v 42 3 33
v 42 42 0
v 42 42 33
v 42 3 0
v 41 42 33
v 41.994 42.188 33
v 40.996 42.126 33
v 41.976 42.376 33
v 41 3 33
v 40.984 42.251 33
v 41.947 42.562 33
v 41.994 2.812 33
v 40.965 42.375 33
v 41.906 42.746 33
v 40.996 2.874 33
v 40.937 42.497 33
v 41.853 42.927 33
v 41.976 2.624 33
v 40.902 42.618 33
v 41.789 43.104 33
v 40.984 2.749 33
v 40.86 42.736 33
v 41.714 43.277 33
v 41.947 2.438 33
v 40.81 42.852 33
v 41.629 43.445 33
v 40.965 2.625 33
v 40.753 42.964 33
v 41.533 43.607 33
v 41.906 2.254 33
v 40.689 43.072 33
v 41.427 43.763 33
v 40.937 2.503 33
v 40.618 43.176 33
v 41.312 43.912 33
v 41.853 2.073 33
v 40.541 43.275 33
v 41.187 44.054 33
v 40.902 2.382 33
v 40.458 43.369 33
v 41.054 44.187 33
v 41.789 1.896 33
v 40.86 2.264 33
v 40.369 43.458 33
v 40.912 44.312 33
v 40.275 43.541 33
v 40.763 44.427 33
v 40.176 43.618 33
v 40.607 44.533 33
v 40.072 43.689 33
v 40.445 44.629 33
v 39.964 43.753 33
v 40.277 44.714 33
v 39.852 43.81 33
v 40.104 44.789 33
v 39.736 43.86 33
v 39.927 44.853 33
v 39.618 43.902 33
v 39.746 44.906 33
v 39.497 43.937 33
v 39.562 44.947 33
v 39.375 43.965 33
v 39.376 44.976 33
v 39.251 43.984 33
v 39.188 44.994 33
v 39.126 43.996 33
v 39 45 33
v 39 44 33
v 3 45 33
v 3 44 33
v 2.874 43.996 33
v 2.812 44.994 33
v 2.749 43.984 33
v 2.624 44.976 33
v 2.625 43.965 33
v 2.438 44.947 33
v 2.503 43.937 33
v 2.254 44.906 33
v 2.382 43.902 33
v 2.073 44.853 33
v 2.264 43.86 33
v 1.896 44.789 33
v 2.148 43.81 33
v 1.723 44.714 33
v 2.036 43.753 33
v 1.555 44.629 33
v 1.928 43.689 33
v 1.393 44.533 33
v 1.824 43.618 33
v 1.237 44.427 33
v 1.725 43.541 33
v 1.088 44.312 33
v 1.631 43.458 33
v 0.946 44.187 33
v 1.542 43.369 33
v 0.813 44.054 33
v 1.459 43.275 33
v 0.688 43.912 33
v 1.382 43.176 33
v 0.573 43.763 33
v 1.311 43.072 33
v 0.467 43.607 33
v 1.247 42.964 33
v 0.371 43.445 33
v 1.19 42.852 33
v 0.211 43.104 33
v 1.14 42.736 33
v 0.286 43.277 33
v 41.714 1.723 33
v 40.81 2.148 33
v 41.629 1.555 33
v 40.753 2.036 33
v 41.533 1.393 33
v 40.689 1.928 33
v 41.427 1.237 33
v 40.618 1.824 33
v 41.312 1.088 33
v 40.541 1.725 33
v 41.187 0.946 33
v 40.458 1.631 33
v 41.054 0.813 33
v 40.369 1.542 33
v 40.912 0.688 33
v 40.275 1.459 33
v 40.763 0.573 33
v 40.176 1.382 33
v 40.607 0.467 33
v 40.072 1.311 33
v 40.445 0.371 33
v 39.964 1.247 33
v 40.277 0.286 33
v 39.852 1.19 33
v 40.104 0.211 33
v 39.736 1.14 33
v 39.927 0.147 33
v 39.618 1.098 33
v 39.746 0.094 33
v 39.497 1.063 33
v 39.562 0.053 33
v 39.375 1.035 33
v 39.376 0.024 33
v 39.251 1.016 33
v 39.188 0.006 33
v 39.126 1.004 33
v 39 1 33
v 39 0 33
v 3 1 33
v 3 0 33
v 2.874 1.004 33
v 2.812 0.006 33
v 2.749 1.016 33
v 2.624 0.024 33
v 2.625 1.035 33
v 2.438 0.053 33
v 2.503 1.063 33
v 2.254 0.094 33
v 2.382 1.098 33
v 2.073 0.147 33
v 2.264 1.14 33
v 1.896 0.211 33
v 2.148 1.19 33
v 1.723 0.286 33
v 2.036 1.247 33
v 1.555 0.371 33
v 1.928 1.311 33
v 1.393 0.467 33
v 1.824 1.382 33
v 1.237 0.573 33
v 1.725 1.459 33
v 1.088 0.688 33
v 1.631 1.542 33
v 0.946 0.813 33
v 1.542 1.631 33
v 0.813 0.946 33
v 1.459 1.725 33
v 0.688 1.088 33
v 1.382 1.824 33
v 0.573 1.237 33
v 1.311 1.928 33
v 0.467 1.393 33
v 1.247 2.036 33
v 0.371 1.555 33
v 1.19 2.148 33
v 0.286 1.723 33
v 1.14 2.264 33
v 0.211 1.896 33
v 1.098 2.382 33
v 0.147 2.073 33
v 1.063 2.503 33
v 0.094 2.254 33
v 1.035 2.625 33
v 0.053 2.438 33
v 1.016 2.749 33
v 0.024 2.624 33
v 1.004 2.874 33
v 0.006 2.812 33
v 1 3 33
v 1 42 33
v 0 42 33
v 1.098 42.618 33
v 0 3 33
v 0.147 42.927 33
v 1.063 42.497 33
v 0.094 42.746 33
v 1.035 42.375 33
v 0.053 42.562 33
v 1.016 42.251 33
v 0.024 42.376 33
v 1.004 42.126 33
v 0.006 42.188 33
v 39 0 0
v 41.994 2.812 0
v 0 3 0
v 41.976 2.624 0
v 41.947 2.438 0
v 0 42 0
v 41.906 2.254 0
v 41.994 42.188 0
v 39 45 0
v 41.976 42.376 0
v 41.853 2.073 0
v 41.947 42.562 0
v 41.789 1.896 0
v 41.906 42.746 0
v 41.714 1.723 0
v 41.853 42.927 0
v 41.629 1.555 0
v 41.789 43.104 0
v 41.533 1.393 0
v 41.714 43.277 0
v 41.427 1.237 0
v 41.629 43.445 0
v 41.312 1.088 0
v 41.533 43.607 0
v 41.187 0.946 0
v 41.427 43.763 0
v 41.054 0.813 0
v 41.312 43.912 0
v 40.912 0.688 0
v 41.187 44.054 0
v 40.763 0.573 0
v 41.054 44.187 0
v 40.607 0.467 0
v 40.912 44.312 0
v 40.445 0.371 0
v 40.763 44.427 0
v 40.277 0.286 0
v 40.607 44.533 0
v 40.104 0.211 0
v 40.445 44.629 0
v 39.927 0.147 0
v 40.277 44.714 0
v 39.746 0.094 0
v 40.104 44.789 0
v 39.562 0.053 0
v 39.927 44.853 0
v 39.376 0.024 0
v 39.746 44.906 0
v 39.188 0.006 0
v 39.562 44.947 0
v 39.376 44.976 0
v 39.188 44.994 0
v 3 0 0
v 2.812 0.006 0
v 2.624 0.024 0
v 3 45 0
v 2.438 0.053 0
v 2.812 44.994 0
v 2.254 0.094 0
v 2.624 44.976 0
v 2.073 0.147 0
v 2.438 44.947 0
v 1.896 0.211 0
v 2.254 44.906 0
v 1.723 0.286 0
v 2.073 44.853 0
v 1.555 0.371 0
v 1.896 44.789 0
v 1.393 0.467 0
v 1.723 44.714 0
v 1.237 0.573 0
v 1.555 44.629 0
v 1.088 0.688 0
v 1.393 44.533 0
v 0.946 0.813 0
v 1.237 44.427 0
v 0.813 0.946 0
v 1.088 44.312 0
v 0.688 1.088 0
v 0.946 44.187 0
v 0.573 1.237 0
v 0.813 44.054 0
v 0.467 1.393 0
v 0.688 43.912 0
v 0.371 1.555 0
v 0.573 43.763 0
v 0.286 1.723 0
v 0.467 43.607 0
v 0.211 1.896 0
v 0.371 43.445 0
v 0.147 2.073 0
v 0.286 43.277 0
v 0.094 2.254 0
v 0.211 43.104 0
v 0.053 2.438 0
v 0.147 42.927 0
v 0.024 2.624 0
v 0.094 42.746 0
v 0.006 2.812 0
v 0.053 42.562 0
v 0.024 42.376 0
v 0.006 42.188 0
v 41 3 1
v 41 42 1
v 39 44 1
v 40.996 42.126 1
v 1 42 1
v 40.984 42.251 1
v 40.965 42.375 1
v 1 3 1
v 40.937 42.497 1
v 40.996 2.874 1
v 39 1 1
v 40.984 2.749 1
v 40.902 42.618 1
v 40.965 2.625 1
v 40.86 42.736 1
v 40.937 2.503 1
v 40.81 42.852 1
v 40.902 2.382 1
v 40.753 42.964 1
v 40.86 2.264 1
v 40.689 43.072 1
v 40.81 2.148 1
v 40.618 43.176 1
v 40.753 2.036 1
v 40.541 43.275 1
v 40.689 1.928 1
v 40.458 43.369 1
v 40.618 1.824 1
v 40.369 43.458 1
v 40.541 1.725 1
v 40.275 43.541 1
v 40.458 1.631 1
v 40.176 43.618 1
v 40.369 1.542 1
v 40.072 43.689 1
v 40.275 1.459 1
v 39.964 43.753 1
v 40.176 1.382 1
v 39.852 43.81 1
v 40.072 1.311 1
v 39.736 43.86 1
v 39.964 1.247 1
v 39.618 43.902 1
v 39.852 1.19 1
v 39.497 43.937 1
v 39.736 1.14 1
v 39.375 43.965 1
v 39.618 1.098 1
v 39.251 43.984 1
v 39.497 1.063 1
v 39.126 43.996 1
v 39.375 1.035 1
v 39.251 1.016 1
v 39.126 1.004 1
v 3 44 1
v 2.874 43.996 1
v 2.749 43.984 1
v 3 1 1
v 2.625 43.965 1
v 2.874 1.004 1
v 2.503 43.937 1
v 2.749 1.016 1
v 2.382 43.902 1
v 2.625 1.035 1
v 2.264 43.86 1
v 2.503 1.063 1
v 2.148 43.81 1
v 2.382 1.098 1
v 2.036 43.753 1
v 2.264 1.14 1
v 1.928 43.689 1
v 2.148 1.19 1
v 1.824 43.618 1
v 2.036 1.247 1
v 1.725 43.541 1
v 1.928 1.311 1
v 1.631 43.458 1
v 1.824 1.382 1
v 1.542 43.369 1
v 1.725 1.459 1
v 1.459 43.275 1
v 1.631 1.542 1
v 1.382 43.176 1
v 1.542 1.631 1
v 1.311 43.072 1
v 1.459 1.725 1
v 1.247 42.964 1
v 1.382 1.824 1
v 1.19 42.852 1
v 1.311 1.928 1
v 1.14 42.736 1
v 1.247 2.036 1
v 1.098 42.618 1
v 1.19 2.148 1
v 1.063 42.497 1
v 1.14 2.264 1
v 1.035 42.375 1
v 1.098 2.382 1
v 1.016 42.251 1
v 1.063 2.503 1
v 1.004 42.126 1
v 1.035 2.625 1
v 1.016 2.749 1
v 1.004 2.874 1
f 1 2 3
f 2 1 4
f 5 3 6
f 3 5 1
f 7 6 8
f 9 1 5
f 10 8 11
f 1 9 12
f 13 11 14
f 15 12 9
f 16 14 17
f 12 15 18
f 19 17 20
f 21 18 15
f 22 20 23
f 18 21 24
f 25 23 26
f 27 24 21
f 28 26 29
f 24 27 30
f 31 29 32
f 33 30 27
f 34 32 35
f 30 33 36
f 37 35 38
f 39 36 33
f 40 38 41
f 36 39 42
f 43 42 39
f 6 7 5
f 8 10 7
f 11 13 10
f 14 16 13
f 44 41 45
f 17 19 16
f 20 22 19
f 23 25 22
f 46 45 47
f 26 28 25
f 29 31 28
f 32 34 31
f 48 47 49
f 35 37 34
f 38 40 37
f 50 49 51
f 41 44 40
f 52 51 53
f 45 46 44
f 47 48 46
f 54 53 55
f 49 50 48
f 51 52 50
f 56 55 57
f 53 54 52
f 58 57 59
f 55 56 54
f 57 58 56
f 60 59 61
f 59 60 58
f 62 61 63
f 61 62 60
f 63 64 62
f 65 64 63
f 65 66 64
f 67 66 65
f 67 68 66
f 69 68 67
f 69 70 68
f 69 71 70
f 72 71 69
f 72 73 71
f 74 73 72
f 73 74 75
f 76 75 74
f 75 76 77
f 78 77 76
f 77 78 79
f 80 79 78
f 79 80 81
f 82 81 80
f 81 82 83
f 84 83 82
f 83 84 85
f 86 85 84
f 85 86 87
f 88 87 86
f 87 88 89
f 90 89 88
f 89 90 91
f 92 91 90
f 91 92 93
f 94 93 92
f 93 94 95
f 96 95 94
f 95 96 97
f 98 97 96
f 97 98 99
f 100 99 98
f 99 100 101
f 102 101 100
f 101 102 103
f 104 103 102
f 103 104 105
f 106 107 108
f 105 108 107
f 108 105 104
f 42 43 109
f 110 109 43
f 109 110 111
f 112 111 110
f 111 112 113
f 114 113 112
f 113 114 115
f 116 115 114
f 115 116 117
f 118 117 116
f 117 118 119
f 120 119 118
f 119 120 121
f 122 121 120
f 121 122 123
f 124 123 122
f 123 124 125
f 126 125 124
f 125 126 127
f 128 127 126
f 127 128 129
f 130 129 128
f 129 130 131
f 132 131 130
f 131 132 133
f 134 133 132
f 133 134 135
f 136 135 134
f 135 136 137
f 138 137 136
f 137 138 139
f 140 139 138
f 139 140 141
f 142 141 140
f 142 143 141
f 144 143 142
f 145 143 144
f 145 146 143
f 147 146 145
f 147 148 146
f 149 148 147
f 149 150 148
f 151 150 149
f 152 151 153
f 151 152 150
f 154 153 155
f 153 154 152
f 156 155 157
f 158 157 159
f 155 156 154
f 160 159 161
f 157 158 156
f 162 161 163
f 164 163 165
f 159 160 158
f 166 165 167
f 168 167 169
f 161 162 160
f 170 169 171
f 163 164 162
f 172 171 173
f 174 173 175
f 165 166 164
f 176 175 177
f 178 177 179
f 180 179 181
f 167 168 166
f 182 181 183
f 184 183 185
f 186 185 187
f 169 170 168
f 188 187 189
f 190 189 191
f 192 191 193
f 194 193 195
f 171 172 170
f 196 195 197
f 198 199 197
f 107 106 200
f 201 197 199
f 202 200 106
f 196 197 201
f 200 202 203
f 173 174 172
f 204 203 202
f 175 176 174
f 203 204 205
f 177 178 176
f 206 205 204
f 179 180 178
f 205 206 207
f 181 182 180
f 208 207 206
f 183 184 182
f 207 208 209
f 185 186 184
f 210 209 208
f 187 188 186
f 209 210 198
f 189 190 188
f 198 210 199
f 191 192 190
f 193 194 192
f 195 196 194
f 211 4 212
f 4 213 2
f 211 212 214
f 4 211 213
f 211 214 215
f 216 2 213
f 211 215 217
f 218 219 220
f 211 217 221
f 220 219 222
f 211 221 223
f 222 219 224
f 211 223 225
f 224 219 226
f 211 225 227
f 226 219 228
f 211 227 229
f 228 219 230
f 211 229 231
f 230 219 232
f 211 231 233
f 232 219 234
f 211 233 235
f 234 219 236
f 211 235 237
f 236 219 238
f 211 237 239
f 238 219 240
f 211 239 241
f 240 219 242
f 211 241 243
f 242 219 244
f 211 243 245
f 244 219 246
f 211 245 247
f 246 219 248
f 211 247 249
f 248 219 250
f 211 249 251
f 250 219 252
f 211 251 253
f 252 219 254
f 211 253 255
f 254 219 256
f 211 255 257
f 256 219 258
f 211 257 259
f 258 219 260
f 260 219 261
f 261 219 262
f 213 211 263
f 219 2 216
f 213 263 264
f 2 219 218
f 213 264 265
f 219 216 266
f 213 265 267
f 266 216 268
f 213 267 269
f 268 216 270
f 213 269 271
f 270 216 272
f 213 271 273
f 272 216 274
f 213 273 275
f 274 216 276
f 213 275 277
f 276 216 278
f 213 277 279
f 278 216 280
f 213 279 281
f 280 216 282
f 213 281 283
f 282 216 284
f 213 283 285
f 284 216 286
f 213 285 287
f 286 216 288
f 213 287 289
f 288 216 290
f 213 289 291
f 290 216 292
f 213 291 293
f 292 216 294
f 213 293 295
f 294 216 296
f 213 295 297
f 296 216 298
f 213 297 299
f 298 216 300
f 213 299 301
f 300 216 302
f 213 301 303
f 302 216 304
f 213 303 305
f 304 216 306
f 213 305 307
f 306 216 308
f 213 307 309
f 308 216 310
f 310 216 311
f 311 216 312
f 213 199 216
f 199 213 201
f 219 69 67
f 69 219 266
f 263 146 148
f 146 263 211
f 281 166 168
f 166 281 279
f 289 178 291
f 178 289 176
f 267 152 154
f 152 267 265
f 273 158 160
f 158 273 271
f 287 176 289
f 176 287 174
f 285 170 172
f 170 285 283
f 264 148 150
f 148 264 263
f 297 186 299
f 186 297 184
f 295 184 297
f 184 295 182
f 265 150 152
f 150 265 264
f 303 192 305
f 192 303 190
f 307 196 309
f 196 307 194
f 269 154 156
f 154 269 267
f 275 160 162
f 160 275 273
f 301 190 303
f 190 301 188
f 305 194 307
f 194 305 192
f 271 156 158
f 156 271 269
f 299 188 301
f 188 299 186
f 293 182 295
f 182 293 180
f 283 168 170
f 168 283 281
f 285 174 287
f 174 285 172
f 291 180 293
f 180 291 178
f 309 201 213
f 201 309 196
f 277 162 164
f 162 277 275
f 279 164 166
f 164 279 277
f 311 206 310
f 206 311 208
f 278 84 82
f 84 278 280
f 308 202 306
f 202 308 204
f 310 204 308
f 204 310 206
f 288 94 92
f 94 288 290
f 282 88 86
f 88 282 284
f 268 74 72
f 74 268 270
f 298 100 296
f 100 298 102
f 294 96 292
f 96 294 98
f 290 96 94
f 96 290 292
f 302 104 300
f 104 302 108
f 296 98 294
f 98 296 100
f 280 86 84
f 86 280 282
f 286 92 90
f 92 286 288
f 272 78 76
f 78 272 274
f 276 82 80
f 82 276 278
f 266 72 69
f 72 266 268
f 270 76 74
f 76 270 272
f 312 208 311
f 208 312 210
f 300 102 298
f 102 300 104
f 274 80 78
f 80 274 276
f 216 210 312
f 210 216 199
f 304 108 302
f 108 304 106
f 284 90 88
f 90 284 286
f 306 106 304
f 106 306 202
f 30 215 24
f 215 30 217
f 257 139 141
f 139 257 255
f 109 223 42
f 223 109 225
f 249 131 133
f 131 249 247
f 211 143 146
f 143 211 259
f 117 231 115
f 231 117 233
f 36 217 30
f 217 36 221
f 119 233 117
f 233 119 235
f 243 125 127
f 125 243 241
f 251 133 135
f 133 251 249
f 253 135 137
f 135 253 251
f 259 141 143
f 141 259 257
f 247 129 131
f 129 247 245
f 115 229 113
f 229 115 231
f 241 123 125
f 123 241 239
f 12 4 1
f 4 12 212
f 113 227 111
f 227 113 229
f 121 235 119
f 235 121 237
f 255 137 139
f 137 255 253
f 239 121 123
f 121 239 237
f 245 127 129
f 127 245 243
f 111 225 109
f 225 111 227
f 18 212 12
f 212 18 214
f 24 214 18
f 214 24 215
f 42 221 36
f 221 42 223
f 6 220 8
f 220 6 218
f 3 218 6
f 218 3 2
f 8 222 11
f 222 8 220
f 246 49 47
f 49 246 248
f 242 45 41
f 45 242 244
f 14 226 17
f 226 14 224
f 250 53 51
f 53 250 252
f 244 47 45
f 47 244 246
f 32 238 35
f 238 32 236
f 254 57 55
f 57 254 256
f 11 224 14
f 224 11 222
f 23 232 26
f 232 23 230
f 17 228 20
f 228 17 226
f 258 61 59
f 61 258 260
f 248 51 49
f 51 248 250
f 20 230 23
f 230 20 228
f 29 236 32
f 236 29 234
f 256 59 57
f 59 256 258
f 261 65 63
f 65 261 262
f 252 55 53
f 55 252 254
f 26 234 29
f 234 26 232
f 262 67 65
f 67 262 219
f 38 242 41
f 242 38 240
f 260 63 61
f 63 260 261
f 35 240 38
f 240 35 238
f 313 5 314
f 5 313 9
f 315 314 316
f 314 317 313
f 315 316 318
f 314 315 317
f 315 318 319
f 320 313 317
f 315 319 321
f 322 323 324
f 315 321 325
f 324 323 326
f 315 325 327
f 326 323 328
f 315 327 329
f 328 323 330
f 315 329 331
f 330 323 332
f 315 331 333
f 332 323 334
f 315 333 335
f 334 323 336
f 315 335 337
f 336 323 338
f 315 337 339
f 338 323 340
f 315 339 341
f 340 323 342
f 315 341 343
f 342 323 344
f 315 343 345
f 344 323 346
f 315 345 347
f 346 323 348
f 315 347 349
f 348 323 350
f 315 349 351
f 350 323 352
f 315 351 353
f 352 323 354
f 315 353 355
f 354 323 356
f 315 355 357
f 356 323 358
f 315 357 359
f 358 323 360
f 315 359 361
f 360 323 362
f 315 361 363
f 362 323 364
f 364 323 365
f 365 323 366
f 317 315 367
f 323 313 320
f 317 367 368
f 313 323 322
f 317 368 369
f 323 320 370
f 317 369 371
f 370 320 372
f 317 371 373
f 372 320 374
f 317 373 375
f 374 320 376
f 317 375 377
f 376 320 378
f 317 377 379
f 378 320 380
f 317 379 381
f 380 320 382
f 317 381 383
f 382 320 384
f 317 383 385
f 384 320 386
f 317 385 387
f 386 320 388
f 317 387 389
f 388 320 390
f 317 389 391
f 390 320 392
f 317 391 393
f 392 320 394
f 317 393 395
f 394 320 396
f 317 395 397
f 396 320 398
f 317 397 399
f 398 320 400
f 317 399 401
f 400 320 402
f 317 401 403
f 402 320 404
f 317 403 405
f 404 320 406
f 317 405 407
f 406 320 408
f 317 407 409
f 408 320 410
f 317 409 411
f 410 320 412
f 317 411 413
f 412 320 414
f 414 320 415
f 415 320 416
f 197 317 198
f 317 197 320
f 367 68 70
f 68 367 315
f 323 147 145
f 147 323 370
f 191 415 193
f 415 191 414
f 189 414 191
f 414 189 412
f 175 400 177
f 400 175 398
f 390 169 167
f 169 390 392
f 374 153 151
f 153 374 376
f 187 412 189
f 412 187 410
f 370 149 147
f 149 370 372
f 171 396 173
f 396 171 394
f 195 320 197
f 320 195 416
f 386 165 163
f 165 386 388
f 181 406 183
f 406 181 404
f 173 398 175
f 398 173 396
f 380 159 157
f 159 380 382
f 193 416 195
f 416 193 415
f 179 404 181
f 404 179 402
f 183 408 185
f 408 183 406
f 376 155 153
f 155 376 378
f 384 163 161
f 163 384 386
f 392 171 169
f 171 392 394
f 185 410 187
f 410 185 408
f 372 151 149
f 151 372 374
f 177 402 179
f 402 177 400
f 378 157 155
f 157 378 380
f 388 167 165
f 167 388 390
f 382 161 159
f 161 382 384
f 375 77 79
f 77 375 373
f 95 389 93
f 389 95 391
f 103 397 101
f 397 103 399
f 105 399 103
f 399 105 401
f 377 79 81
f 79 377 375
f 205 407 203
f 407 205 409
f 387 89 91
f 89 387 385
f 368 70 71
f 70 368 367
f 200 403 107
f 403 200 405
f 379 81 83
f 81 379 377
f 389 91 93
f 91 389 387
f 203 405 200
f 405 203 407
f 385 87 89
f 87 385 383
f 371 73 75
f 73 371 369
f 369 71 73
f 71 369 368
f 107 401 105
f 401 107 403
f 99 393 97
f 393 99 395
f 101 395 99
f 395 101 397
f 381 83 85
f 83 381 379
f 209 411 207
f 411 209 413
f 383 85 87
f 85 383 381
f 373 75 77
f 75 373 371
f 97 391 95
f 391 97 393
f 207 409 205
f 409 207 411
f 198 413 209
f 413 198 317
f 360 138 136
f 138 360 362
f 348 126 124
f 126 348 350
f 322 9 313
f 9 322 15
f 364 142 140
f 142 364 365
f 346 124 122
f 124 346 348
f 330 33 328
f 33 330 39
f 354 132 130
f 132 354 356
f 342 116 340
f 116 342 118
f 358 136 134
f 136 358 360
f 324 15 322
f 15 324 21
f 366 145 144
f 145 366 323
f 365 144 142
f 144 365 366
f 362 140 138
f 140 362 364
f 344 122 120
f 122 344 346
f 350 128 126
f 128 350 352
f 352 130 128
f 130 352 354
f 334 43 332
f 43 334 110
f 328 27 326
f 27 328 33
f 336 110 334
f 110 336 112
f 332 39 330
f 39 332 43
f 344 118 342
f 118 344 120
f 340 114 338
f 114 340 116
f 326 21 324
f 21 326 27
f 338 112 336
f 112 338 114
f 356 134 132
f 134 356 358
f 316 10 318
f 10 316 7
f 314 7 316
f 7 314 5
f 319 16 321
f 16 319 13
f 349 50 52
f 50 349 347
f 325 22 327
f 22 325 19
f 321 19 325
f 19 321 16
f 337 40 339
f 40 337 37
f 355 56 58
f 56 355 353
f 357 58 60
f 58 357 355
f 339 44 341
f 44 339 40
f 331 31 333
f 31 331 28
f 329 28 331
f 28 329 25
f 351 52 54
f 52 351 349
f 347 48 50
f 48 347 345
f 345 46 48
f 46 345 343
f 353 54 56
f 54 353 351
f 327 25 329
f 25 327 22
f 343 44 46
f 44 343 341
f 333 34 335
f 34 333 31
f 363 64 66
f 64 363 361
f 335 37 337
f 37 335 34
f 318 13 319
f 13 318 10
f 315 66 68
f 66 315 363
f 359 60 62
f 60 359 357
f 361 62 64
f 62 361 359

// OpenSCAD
// Generic storage blocks
// Hussein Suleman
// 28 March 2018

// Height of the box
height = 33;

// Width of the box
width = 42;

// Length of the box
length = 45;

// Wall thickness
wall = 1;

// Floor thickness
floors = 1;

// Corner radius
radius = 3;

// create rounded box with recessed inner surface
module roundbox (w, h, d, rimw, rimr, base)
{
    difference () {
       union () {
          translate ([0,rimr,0]) cube ([w,h-(2*rimr),d]);
          translate ([rimr,0,0]) cube ([w-(2*rimr),h,d]);
          translate ([rimr,rimr,0]) cylinder (r=rimr,h=d,$fn=100);
          translate ([rimr,h-rimr,0]) cylinder (r=rimr,h=d,$fn=100);
          translate ([w-rimr,rimr,0]) cylinder (r=rimr,h=d,$fn=100);
          translate ([w-rimr,h-rimr,0]) cylinder (r=rimr,h=d,$fn=100);
       }
          translate ([rimw,rimr,base]) cube ([w-(2*rimw),h-(2*rimr),d-base+1]);
          translate ([rimr,rimw,base]) cube ([w-(2*rimr),h-(2*rimw),d-base+1]);
          translate ([rimr,rimr,base]) cylinder (r=rimr-rimw,h=d-base+1,$fn=100);
          translate ([rimr,h-rimr,base]) cylinder (r=rimr-rimw,h=d-base+1,$fn=100);
          translate ([w-rimr,rimr,base]) cylinder (r=rimr-rimw,h=d-base+1,$fn=100);
          translate ([w-rimr,h-rimr,base]) cylinder (r=rimr-rimw,h=d-base+1,$fn=100);
       
    }
}

roundbox (width, length, height, wall, radius, floors);
